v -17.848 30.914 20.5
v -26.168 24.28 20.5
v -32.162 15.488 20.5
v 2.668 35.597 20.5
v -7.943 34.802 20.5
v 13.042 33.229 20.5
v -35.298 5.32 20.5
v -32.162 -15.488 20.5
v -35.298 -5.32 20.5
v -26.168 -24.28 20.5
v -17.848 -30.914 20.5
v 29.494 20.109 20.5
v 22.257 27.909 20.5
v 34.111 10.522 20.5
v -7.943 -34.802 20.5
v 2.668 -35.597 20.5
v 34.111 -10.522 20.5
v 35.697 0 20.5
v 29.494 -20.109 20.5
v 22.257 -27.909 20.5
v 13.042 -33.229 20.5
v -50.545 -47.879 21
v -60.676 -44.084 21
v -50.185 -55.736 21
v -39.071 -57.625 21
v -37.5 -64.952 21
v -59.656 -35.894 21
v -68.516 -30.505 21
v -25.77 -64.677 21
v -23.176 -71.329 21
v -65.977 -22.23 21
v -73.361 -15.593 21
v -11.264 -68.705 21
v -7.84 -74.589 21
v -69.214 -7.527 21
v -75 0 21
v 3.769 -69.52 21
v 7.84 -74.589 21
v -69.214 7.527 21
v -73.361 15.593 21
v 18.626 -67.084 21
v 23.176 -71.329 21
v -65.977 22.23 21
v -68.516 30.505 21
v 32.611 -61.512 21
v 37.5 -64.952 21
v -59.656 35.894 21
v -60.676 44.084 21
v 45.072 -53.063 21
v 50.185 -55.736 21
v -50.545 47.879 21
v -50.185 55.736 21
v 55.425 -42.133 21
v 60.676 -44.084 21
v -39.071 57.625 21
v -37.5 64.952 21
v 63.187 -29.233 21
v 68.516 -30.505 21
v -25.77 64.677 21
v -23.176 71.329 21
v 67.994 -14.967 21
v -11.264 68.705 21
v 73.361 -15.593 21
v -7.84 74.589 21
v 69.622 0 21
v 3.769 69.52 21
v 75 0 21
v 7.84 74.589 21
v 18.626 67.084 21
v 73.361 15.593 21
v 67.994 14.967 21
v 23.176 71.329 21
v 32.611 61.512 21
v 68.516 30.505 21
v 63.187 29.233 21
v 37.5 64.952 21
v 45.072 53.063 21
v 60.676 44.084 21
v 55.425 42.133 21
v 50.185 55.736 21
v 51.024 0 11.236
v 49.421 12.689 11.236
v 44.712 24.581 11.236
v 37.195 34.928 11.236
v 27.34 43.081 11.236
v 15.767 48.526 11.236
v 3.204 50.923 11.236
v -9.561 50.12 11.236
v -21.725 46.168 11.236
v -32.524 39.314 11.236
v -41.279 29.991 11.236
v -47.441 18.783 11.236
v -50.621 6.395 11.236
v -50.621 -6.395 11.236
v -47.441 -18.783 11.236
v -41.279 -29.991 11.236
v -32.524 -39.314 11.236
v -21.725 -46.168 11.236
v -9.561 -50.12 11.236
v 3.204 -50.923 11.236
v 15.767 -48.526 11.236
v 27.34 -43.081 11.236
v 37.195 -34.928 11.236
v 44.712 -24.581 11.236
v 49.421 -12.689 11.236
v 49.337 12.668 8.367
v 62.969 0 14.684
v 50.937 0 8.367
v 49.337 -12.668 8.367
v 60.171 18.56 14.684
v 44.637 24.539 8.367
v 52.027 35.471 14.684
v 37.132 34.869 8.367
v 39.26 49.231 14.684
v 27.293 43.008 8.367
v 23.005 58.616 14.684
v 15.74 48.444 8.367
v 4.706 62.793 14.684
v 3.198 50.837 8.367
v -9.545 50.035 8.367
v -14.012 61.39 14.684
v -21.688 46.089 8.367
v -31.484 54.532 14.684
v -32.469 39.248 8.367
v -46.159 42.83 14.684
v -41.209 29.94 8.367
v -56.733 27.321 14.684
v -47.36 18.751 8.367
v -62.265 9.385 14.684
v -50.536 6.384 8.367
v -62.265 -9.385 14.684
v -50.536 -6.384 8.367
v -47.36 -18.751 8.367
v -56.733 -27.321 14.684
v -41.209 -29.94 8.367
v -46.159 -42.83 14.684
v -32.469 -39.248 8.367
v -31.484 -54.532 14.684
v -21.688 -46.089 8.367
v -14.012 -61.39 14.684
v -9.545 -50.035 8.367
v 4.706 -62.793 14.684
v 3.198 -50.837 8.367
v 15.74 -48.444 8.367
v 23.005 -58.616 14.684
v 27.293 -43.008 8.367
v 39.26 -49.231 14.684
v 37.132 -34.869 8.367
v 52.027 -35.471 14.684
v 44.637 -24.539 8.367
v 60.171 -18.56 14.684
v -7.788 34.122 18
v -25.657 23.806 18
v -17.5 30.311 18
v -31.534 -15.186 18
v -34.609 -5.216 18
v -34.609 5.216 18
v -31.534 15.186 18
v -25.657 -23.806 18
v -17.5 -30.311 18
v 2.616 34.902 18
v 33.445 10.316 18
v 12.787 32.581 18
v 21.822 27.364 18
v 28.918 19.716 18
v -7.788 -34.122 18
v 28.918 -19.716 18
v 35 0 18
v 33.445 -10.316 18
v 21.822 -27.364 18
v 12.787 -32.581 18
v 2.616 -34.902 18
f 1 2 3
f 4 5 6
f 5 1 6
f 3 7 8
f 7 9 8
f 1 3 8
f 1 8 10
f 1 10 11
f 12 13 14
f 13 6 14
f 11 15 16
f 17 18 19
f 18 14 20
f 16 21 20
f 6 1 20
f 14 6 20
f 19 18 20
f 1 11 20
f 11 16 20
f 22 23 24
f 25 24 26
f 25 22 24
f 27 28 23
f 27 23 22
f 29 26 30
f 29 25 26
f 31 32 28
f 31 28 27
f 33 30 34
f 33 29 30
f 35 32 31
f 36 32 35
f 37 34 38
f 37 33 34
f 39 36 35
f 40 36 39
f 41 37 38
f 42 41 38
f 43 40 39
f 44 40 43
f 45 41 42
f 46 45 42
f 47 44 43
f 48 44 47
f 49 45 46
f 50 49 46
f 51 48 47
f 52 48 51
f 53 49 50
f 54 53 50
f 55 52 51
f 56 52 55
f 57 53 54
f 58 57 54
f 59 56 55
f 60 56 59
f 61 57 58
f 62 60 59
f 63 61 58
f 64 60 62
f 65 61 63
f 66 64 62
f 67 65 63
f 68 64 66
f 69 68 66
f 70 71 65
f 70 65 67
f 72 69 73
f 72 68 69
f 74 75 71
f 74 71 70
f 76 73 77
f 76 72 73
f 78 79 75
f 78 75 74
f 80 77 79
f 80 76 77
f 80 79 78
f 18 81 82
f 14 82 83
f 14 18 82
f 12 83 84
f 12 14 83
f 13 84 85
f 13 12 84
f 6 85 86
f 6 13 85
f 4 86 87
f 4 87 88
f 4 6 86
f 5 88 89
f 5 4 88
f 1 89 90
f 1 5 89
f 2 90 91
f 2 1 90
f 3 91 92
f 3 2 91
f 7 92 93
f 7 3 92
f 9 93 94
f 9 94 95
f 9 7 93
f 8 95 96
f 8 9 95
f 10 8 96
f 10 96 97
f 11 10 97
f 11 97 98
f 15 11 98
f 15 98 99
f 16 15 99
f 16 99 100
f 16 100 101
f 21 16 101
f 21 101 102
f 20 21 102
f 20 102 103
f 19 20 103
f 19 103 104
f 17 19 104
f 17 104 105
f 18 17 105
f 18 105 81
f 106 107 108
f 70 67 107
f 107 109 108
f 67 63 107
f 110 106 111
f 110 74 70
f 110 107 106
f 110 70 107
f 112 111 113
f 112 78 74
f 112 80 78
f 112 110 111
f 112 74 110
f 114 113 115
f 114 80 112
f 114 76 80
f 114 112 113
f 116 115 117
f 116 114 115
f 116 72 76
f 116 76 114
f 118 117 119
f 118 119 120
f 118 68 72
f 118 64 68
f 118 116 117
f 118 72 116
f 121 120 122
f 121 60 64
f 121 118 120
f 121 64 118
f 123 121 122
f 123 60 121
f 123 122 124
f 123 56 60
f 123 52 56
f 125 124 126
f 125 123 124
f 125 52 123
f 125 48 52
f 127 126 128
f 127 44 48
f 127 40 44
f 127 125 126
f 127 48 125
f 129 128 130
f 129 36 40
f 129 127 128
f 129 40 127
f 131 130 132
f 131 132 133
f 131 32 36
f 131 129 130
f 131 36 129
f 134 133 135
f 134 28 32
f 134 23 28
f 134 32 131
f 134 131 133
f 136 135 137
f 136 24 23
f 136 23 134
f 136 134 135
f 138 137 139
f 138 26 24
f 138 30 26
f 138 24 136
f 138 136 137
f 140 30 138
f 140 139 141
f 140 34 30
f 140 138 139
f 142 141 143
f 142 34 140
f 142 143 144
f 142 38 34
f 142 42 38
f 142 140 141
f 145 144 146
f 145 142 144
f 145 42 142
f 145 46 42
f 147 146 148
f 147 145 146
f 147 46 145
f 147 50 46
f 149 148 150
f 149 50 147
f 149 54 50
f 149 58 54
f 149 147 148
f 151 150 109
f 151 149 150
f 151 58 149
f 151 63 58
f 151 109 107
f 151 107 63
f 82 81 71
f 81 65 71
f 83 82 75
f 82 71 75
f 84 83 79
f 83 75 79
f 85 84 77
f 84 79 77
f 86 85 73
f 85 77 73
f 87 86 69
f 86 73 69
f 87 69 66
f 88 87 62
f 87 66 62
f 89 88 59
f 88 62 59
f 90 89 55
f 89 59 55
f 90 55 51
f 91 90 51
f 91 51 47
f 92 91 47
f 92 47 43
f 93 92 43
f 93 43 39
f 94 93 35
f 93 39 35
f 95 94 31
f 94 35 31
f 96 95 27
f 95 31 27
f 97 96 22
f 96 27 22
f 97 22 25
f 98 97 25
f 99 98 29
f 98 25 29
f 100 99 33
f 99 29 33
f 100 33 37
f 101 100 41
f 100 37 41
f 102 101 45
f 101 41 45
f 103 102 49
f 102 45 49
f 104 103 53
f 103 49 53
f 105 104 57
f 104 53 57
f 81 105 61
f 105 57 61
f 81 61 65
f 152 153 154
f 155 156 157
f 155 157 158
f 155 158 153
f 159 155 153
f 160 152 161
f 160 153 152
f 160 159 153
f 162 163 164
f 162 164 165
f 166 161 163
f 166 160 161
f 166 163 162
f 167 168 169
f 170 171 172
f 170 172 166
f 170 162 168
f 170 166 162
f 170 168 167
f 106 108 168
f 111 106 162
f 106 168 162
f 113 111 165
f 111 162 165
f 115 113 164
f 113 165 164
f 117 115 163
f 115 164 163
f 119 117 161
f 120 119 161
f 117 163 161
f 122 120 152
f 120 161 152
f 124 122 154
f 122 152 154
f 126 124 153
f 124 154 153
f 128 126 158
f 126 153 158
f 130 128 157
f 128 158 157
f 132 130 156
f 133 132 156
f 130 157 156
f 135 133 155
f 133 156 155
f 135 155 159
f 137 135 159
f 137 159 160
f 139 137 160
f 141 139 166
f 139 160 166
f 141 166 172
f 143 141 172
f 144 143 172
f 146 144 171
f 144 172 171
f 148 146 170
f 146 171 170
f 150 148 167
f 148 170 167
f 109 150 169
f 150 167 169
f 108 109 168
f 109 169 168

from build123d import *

# Parameters (mm, degrees)
F0_R     = 35
F2_R     = 75
F4_R     = 35
F5_DEPTH = 18
F7_T     = -2.5


# Not quite as in the source:
# - a fillet or chamfer that OpenCascade refuses, or shapes differently, is made with other operations: its cross-section is extruded or revolved along the edge and cut away or added


with BuildPart() as f3:
    # F0 (on Top) → F3 section 0
    with BuildSketch(Plane.XY):
        Circle(F0_R)
    # F2 (on offset) → F3 section 1
    with BuildSketch(Plane.XY.offset(21)):
        Circle(F2_R)
    loft()

    # F4 (on face) → F5 (cut)
    with BuildSketch(Plane(origin=(0, 0, 0), x_dir=(1, 0, 0), z_dir=(0, 0, -1))):
        Circle(F4_R)
    extrude(amount=-F5_DEPTH, mode=Mode.SUBTRACT)

    # F6: chamfer of 18 on 1 edges, made by hand


with BuildPart() as f6_tool2:
    # F6_s3 → F6_t4 (revolve)
    with BuildSketch(Plane.XZ):
        Polygon((50.9371622511, 8.3670101818), (35, 18), (35, 0), align=None)
    revolve(axis=Axis((0, 0, 0), (0, 0, 1)))

    split(bisect_by=Plane.XY.offset(18), keep=Keep.BOTTOM)


with BuildPart() as f3_1:
    add(f3.part)

    # F6_t1: cut F6_tool2
    add(f6_tool2.part, mode=Mode.SUBTRACT)

    # F7
    f7_openings = [f3_1.faces().sort_by_distance(p)[0] for p in [
        (0, 0, 21),
    ]]
    offset(amount=F7_T, openings=f7_openings, kind=Kind.INTERSECTION)


solid = f3_1.part
